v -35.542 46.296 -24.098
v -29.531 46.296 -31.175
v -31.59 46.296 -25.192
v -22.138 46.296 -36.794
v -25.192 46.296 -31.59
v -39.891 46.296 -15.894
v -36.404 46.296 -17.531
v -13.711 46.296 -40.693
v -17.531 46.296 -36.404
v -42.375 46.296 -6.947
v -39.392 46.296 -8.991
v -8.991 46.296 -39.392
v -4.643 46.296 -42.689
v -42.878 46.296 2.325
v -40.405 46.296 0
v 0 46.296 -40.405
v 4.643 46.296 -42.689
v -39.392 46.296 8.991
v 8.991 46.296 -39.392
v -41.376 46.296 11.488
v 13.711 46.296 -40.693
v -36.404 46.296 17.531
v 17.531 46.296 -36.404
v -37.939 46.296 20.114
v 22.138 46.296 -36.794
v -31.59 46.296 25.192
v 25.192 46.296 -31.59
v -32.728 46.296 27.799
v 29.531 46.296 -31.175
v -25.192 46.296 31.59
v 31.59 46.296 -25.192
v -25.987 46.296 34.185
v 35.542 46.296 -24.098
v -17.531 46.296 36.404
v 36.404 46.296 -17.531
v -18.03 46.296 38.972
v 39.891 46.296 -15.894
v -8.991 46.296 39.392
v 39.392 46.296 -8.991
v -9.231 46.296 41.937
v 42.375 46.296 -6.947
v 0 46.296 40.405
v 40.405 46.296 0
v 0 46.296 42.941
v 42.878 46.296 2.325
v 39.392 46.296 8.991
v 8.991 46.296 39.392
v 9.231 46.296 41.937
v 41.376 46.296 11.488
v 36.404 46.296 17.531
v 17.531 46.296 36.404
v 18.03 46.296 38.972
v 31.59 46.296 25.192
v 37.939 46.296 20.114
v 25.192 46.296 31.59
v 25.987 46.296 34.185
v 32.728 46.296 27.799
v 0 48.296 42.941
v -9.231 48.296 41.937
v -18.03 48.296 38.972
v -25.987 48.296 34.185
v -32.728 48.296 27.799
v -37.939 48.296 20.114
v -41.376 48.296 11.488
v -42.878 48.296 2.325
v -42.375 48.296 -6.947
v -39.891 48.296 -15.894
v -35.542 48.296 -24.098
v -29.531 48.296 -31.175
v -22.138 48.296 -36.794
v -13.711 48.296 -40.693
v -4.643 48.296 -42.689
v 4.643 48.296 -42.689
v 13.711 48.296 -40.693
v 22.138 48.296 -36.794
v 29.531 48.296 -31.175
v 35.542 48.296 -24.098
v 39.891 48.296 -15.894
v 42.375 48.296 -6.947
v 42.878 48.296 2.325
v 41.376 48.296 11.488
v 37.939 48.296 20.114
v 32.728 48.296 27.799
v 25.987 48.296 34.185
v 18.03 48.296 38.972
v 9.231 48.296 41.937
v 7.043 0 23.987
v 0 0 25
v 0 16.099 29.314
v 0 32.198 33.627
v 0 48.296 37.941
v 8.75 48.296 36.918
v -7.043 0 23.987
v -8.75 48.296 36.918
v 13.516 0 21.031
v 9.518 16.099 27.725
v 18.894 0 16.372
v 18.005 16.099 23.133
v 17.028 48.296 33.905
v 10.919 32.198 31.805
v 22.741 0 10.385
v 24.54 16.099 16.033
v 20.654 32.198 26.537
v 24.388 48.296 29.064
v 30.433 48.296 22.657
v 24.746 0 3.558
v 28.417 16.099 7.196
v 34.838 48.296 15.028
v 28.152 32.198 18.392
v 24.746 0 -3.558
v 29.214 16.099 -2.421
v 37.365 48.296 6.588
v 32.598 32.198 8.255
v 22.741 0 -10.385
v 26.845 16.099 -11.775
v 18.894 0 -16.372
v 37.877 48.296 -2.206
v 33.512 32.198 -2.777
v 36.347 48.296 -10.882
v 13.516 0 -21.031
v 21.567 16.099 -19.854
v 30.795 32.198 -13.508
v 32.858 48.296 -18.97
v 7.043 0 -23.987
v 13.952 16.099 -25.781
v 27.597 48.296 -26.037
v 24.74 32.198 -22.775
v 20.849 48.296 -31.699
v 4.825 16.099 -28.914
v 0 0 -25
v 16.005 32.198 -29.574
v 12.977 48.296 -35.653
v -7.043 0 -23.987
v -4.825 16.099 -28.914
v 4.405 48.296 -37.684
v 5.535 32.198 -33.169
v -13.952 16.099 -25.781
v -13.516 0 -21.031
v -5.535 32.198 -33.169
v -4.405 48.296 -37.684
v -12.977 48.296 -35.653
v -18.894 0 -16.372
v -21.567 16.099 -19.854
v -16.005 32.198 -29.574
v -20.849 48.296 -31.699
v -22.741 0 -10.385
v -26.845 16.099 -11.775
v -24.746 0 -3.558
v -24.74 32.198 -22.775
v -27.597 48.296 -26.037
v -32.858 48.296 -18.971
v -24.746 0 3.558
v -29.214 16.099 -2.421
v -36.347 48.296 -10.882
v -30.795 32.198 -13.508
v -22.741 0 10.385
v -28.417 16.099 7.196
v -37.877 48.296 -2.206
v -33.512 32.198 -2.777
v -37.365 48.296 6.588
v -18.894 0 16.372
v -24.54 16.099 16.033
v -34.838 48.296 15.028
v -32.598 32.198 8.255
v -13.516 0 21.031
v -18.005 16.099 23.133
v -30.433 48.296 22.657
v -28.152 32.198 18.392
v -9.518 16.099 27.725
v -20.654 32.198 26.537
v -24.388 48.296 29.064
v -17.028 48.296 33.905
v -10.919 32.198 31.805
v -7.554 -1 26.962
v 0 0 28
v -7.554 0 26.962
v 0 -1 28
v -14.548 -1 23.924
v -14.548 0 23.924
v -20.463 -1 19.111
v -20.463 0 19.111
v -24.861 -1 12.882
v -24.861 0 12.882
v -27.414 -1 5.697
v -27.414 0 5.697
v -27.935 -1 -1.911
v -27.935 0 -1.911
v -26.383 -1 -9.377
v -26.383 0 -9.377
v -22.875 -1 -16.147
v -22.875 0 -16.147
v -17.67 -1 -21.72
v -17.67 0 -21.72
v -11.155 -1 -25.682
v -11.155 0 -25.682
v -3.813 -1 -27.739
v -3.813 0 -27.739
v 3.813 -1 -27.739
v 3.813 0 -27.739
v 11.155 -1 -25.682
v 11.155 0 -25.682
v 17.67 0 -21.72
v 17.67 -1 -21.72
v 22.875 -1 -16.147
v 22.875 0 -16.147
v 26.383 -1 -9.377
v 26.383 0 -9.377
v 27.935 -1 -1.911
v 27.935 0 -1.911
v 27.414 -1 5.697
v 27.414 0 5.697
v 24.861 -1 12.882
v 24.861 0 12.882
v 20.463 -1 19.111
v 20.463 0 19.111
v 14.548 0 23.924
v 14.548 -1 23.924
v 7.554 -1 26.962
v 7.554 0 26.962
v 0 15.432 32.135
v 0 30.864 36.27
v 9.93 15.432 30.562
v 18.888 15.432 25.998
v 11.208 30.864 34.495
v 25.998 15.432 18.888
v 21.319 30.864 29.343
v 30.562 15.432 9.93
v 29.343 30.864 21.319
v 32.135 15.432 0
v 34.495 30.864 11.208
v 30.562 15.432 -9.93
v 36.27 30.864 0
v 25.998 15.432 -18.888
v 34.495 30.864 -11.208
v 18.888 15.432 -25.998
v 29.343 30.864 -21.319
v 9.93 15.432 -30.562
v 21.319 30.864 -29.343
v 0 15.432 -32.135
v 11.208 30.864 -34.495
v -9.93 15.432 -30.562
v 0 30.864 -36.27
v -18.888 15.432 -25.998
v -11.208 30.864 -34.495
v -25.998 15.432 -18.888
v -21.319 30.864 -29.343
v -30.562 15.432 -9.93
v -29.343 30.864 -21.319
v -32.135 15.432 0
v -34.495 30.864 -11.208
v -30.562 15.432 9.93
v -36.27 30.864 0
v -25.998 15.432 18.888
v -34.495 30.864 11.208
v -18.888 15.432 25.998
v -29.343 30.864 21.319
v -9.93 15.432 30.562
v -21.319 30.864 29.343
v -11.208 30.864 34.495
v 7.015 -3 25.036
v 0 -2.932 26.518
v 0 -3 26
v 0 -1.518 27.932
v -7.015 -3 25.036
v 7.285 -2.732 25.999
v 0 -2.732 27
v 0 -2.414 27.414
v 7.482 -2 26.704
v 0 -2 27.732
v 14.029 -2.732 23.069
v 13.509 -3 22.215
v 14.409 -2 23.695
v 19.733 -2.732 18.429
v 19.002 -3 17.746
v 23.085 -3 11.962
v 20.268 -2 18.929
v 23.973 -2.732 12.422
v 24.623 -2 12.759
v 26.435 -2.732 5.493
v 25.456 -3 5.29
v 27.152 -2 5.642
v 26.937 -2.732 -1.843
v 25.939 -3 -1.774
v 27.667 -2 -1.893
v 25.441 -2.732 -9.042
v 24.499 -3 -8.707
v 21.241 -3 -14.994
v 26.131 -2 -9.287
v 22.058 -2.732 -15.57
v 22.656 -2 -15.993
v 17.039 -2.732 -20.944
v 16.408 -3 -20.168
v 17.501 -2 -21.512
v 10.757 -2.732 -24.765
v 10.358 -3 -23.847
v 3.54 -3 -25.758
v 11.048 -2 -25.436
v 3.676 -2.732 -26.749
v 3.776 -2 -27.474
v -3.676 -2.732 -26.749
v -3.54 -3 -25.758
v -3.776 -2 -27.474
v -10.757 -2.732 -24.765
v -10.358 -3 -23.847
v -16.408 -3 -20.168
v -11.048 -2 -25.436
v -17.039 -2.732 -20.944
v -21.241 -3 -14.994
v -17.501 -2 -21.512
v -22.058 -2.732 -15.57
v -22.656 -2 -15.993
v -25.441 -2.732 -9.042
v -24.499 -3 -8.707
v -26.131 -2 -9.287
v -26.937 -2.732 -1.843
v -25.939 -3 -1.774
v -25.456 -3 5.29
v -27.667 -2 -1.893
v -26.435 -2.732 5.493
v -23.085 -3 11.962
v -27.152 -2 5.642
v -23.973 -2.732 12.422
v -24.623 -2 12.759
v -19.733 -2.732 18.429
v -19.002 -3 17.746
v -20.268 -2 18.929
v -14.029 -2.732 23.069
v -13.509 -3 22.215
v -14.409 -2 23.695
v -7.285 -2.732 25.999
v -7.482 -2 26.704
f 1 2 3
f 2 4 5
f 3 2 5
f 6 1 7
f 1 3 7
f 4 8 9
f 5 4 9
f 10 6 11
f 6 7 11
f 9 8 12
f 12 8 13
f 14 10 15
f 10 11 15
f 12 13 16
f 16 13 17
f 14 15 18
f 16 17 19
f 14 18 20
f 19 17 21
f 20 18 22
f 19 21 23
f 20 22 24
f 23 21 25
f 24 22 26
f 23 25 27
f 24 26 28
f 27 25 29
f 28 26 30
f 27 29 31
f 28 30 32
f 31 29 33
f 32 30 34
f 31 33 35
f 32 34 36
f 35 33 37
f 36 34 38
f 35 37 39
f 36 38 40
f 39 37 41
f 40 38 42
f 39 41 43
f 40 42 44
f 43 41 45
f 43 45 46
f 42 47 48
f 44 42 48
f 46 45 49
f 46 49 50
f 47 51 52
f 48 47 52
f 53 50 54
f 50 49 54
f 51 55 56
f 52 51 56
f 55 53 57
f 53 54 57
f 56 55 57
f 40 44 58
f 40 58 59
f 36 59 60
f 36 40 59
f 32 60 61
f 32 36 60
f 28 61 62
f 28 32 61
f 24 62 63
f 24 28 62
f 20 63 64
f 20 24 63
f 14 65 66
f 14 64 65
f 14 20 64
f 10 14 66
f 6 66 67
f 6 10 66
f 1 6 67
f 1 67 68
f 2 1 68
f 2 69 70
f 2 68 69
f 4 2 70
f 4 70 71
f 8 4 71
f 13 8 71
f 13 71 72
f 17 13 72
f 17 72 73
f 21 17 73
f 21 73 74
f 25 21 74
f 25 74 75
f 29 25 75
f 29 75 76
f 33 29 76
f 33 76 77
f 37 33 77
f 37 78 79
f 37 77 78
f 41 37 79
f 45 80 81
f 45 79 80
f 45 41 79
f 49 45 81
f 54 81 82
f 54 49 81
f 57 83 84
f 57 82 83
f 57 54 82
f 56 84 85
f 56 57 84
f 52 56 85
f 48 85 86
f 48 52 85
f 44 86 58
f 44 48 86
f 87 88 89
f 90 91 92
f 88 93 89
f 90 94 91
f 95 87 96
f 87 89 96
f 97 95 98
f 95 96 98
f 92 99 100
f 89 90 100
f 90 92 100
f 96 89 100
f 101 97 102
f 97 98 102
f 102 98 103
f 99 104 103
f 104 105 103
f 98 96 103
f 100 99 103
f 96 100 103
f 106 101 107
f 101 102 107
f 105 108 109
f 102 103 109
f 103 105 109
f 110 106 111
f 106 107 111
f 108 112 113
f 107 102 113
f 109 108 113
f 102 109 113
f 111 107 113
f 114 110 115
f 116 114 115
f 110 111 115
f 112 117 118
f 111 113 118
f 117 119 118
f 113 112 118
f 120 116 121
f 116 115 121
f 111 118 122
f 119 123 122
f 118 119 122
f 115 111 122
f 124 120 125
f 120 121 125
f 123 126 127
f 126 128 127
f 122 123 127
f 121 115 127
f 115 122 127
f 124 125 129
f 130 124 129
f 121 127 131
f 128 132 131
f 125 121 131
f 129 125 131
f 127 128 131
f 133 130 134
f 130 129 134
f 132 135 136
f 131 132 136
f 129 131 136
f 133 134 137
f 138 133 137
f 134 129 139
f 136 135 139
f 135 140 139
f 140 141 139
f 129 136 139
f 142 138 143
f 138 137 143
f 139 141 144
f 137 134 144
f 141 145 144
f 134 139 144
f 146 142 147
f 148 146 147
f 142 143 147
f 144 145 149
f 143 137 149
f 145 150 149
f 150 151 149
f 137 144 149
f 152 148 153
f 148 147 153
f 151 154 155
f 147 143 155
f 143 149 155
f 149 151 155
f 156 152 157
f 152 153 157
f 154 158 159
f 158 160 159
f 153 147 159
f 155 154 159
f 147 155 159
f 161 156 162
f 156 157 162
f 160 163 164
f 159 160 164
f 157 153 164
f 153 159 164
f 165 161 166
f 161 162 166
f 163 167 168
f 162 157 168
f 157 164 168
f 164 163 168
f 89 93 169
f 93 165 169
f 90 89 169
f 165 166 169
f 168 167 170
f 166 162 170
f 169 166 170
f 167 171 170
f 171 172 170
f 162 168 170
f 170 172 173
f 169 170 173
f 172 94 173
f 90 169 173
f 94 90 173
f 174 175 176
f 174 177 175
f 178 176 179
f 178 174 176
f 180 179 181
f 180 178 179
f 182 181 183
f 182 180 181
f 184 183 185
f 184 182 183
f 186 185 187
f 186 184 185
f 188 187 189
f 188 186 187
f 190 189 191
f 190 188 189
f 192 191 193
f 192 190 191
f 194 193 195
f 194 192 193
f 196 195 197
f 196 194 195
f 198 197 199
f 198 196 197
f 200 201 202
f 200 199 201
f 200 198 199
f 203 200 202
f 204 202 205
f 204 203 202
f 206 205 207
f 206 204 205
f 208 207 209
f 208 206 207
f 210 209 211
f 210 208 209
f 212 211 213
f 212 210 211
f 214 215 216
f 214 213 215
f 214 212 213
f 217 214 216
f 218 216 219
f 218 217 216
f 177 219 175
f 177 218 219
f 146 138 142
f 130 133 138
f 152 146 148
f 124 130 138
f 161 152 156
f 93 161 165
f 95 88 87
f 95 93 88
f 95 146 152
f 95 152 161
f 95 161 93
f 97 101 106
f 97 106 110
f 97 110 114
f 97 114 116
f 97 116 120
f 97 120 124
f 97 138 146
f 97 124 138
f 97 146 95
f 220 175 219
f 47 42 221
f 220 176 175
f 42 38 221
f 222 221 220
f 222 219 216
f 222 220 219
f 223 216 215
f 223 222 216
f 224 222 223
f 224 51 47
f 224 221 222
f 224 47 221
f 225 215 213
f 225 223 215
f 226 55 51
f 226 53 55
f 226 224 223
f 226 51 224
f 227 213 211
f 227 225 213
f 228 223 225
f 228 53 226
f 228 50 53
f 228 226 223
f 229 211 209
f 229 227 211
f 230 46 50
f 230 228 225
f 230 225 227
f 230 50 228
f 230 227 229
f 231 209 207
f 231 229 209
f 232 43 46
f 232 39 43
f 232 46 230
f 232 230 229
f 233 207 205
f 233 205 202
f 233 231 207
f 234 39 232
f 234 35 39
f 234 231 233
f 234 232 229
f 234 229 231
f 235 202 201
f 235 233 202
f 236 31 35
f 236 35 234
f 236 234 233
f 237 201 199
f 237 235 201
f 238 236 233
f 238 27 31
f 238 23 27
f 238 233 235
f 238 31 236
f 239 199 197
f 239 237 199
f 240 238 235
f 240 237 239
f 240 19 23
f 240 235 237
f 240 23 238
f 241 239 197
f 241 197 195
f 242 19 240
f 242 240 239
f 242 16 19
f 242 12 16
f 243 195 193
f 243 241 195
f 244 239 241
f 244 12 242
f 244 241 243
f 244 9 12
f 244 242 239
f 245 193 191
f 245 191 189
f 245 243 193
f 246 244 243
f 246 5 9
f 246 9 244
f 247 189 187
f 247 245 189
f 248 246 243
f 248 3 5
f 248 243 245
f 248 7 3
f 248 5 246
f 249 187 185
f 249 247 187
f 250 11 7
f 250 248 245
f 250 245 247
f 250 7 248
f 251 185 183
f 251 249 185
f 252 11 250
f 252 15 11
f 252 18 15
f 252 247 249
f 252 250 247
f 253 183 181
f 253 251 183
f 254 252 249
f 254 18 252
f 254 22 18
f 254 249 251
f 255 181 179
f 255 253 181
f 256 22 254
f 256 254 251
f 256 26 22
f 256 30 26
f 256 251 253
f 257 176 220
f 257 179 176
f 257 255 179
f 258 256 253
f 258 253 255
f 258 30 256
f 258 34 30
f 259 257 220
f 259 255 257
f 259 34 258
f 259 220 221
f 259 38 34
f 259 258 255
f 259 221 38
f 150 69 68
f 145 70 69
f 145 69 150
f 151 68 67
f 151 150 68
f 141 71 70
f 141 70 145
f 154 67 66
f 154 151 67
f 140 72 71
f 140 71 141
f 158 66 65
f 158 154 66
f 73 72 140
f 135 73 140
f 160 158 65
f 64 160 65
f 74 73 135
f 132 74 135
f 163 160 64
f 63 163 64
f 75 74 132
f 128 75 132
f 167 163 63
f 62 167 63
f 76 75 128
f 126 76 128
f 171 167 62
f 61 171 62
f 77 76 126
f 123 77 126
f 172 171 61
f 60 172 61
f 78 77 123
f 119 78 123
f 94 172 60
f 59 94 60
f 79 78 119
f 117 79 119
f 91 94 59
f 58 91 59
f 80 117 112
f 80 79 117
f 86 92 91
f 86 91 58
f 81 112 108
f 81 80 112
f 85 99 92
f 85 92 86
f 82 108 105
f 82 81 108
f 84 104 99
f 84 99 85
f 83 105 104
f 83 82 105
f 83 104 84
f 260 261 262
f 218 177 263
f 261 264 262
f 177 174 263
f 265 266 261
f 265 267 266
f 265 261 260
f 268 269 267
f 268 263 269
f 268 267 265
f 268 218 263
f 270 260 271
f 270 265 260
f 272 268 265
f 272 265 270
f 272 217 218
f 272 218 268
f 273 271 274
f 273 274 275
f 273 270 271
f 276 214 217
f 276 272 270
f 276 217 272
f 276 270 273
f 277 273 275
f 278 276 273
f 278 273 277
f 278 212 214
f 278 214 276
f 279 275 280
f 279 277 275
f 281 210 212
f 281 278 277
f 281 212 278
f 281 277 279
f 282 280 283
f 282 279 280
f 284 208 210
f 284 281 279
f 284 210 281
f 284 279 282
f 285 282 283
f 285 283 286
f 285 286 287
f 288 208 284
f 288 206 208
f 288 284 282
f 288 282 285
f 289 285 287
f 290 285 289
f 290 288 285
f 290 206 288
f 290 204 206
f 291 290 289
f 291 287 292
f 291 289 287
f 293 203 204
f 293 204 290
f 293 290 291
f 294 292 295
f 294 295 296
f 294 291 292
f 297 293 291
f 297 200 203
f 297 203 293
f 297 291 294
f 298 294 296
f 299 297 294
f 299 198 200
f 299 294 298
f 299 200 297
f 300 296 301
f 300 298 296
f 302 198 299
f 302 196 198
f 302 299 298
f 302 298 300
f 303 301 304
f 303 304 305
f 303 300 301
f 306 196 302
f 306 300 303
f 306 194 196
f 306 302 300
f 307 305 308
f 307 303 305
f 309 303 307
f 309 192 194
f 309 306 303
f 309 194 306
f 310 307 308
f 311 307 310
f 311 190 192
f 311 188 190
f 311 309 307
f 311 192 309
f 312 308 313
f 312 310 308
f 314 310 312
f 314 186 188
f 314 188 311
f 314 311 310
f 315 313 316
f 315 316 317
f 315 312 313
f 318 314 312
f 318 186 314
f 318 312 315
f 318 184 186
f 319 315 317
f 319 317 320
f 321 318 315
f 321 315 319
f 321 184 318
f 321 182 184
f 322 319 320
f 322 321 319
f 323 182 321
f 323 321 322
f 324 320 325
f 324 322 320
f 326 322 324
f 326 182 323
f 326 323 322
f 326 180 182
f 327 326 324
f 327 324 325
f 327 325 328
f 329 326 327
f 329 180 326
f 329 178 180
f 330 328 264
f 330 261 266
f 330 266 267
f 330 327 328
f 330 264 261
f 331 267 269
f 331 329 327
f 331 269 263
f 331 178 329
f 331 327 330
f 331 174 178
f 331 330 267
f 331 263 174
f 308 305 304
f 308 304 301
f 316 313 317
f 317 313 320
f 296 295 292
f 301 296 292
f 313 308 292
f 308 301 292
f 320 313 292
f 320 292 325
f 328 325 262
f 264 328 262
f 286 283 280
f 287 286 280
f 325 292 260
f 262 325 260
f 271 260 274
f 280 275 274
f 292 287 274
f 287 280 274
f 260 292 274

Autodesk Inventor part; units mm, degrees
ref_plane "YZ Plane" through (0, 0, 0) normal (1, 0, 0) x (0, 1, 0)
ref_plane "XZ Plane" through (0, 0, 0) normal (0, 1, 0) x (-1, 0, 0)
ref_plane "XY Plane" through (0, 0, 0) normal (0, 0, 1) x (1, 0, 0)
sketch "Sketch1" plane through (0, 0, 0) normal (1, 0, 0) x (0, 1, 0)
  line L0 (0, 0) -> (0, 25)
  line L1 (0, 25) -> (48.2963, 37.941)
  line L2 (48.2963, 37.941) -> (48.2963, 42.941)
  line L3 (48.2963, 42.941) -> (46.2963, 42.941)
  line L4 (0, 25) -> (0, 28)
  line L5 (0, 28) -> (46.2963, 40.4051)
  line L6 (0, 28) -> (-3, 28)
  line L7 (-3, 28) -> (-3, 0)
  line L8 (-3, 0) -> (0, 0)
  line L9 (0, 0) -> (0, 28)
  line L10 (46.2963, 42.941) -> (46.2963, 40.4051)
  line L11 (0, 28) -> (0, 25)
  line L12 (0, 25) -> (48.2963, 37.941)
  line L13 (48.2963, 37.941) -> (48.2963, 42.941)
  line L14 (48.2963, 42.941) -> (46.2963, 42.941)
  line L15 (46.2963, 42.941) -> (46.2963, 40.4051)
  line L16 (46.2963, 40.4051) -> (0, 28)
  line L17 (0, 28) -> (0, 25)
  dimension "d0" = 25
  dimension "d1" = 50
  dimension "d2" = 105
  dimension "d3" = 5
  dimension "d4" = 2
  dimension "d5" = 3
  dimension "d6" = 105
  dimension "d7" = 3
sketch "Sketch2" plane through (0, 0, 0) normal (1, 0, 0) x (0, 1, 0)
  line L0 (0, 0) -> (3.3899, 0)
revolve "Revolution1" add sketch "Sketch1" angle 360 about axis through (0, 0, 0) along (0, 1, 0)
fillet "Fillet1" radius 2 1 edges at (0, -3, -28)
properties part number "_3DPrint"
